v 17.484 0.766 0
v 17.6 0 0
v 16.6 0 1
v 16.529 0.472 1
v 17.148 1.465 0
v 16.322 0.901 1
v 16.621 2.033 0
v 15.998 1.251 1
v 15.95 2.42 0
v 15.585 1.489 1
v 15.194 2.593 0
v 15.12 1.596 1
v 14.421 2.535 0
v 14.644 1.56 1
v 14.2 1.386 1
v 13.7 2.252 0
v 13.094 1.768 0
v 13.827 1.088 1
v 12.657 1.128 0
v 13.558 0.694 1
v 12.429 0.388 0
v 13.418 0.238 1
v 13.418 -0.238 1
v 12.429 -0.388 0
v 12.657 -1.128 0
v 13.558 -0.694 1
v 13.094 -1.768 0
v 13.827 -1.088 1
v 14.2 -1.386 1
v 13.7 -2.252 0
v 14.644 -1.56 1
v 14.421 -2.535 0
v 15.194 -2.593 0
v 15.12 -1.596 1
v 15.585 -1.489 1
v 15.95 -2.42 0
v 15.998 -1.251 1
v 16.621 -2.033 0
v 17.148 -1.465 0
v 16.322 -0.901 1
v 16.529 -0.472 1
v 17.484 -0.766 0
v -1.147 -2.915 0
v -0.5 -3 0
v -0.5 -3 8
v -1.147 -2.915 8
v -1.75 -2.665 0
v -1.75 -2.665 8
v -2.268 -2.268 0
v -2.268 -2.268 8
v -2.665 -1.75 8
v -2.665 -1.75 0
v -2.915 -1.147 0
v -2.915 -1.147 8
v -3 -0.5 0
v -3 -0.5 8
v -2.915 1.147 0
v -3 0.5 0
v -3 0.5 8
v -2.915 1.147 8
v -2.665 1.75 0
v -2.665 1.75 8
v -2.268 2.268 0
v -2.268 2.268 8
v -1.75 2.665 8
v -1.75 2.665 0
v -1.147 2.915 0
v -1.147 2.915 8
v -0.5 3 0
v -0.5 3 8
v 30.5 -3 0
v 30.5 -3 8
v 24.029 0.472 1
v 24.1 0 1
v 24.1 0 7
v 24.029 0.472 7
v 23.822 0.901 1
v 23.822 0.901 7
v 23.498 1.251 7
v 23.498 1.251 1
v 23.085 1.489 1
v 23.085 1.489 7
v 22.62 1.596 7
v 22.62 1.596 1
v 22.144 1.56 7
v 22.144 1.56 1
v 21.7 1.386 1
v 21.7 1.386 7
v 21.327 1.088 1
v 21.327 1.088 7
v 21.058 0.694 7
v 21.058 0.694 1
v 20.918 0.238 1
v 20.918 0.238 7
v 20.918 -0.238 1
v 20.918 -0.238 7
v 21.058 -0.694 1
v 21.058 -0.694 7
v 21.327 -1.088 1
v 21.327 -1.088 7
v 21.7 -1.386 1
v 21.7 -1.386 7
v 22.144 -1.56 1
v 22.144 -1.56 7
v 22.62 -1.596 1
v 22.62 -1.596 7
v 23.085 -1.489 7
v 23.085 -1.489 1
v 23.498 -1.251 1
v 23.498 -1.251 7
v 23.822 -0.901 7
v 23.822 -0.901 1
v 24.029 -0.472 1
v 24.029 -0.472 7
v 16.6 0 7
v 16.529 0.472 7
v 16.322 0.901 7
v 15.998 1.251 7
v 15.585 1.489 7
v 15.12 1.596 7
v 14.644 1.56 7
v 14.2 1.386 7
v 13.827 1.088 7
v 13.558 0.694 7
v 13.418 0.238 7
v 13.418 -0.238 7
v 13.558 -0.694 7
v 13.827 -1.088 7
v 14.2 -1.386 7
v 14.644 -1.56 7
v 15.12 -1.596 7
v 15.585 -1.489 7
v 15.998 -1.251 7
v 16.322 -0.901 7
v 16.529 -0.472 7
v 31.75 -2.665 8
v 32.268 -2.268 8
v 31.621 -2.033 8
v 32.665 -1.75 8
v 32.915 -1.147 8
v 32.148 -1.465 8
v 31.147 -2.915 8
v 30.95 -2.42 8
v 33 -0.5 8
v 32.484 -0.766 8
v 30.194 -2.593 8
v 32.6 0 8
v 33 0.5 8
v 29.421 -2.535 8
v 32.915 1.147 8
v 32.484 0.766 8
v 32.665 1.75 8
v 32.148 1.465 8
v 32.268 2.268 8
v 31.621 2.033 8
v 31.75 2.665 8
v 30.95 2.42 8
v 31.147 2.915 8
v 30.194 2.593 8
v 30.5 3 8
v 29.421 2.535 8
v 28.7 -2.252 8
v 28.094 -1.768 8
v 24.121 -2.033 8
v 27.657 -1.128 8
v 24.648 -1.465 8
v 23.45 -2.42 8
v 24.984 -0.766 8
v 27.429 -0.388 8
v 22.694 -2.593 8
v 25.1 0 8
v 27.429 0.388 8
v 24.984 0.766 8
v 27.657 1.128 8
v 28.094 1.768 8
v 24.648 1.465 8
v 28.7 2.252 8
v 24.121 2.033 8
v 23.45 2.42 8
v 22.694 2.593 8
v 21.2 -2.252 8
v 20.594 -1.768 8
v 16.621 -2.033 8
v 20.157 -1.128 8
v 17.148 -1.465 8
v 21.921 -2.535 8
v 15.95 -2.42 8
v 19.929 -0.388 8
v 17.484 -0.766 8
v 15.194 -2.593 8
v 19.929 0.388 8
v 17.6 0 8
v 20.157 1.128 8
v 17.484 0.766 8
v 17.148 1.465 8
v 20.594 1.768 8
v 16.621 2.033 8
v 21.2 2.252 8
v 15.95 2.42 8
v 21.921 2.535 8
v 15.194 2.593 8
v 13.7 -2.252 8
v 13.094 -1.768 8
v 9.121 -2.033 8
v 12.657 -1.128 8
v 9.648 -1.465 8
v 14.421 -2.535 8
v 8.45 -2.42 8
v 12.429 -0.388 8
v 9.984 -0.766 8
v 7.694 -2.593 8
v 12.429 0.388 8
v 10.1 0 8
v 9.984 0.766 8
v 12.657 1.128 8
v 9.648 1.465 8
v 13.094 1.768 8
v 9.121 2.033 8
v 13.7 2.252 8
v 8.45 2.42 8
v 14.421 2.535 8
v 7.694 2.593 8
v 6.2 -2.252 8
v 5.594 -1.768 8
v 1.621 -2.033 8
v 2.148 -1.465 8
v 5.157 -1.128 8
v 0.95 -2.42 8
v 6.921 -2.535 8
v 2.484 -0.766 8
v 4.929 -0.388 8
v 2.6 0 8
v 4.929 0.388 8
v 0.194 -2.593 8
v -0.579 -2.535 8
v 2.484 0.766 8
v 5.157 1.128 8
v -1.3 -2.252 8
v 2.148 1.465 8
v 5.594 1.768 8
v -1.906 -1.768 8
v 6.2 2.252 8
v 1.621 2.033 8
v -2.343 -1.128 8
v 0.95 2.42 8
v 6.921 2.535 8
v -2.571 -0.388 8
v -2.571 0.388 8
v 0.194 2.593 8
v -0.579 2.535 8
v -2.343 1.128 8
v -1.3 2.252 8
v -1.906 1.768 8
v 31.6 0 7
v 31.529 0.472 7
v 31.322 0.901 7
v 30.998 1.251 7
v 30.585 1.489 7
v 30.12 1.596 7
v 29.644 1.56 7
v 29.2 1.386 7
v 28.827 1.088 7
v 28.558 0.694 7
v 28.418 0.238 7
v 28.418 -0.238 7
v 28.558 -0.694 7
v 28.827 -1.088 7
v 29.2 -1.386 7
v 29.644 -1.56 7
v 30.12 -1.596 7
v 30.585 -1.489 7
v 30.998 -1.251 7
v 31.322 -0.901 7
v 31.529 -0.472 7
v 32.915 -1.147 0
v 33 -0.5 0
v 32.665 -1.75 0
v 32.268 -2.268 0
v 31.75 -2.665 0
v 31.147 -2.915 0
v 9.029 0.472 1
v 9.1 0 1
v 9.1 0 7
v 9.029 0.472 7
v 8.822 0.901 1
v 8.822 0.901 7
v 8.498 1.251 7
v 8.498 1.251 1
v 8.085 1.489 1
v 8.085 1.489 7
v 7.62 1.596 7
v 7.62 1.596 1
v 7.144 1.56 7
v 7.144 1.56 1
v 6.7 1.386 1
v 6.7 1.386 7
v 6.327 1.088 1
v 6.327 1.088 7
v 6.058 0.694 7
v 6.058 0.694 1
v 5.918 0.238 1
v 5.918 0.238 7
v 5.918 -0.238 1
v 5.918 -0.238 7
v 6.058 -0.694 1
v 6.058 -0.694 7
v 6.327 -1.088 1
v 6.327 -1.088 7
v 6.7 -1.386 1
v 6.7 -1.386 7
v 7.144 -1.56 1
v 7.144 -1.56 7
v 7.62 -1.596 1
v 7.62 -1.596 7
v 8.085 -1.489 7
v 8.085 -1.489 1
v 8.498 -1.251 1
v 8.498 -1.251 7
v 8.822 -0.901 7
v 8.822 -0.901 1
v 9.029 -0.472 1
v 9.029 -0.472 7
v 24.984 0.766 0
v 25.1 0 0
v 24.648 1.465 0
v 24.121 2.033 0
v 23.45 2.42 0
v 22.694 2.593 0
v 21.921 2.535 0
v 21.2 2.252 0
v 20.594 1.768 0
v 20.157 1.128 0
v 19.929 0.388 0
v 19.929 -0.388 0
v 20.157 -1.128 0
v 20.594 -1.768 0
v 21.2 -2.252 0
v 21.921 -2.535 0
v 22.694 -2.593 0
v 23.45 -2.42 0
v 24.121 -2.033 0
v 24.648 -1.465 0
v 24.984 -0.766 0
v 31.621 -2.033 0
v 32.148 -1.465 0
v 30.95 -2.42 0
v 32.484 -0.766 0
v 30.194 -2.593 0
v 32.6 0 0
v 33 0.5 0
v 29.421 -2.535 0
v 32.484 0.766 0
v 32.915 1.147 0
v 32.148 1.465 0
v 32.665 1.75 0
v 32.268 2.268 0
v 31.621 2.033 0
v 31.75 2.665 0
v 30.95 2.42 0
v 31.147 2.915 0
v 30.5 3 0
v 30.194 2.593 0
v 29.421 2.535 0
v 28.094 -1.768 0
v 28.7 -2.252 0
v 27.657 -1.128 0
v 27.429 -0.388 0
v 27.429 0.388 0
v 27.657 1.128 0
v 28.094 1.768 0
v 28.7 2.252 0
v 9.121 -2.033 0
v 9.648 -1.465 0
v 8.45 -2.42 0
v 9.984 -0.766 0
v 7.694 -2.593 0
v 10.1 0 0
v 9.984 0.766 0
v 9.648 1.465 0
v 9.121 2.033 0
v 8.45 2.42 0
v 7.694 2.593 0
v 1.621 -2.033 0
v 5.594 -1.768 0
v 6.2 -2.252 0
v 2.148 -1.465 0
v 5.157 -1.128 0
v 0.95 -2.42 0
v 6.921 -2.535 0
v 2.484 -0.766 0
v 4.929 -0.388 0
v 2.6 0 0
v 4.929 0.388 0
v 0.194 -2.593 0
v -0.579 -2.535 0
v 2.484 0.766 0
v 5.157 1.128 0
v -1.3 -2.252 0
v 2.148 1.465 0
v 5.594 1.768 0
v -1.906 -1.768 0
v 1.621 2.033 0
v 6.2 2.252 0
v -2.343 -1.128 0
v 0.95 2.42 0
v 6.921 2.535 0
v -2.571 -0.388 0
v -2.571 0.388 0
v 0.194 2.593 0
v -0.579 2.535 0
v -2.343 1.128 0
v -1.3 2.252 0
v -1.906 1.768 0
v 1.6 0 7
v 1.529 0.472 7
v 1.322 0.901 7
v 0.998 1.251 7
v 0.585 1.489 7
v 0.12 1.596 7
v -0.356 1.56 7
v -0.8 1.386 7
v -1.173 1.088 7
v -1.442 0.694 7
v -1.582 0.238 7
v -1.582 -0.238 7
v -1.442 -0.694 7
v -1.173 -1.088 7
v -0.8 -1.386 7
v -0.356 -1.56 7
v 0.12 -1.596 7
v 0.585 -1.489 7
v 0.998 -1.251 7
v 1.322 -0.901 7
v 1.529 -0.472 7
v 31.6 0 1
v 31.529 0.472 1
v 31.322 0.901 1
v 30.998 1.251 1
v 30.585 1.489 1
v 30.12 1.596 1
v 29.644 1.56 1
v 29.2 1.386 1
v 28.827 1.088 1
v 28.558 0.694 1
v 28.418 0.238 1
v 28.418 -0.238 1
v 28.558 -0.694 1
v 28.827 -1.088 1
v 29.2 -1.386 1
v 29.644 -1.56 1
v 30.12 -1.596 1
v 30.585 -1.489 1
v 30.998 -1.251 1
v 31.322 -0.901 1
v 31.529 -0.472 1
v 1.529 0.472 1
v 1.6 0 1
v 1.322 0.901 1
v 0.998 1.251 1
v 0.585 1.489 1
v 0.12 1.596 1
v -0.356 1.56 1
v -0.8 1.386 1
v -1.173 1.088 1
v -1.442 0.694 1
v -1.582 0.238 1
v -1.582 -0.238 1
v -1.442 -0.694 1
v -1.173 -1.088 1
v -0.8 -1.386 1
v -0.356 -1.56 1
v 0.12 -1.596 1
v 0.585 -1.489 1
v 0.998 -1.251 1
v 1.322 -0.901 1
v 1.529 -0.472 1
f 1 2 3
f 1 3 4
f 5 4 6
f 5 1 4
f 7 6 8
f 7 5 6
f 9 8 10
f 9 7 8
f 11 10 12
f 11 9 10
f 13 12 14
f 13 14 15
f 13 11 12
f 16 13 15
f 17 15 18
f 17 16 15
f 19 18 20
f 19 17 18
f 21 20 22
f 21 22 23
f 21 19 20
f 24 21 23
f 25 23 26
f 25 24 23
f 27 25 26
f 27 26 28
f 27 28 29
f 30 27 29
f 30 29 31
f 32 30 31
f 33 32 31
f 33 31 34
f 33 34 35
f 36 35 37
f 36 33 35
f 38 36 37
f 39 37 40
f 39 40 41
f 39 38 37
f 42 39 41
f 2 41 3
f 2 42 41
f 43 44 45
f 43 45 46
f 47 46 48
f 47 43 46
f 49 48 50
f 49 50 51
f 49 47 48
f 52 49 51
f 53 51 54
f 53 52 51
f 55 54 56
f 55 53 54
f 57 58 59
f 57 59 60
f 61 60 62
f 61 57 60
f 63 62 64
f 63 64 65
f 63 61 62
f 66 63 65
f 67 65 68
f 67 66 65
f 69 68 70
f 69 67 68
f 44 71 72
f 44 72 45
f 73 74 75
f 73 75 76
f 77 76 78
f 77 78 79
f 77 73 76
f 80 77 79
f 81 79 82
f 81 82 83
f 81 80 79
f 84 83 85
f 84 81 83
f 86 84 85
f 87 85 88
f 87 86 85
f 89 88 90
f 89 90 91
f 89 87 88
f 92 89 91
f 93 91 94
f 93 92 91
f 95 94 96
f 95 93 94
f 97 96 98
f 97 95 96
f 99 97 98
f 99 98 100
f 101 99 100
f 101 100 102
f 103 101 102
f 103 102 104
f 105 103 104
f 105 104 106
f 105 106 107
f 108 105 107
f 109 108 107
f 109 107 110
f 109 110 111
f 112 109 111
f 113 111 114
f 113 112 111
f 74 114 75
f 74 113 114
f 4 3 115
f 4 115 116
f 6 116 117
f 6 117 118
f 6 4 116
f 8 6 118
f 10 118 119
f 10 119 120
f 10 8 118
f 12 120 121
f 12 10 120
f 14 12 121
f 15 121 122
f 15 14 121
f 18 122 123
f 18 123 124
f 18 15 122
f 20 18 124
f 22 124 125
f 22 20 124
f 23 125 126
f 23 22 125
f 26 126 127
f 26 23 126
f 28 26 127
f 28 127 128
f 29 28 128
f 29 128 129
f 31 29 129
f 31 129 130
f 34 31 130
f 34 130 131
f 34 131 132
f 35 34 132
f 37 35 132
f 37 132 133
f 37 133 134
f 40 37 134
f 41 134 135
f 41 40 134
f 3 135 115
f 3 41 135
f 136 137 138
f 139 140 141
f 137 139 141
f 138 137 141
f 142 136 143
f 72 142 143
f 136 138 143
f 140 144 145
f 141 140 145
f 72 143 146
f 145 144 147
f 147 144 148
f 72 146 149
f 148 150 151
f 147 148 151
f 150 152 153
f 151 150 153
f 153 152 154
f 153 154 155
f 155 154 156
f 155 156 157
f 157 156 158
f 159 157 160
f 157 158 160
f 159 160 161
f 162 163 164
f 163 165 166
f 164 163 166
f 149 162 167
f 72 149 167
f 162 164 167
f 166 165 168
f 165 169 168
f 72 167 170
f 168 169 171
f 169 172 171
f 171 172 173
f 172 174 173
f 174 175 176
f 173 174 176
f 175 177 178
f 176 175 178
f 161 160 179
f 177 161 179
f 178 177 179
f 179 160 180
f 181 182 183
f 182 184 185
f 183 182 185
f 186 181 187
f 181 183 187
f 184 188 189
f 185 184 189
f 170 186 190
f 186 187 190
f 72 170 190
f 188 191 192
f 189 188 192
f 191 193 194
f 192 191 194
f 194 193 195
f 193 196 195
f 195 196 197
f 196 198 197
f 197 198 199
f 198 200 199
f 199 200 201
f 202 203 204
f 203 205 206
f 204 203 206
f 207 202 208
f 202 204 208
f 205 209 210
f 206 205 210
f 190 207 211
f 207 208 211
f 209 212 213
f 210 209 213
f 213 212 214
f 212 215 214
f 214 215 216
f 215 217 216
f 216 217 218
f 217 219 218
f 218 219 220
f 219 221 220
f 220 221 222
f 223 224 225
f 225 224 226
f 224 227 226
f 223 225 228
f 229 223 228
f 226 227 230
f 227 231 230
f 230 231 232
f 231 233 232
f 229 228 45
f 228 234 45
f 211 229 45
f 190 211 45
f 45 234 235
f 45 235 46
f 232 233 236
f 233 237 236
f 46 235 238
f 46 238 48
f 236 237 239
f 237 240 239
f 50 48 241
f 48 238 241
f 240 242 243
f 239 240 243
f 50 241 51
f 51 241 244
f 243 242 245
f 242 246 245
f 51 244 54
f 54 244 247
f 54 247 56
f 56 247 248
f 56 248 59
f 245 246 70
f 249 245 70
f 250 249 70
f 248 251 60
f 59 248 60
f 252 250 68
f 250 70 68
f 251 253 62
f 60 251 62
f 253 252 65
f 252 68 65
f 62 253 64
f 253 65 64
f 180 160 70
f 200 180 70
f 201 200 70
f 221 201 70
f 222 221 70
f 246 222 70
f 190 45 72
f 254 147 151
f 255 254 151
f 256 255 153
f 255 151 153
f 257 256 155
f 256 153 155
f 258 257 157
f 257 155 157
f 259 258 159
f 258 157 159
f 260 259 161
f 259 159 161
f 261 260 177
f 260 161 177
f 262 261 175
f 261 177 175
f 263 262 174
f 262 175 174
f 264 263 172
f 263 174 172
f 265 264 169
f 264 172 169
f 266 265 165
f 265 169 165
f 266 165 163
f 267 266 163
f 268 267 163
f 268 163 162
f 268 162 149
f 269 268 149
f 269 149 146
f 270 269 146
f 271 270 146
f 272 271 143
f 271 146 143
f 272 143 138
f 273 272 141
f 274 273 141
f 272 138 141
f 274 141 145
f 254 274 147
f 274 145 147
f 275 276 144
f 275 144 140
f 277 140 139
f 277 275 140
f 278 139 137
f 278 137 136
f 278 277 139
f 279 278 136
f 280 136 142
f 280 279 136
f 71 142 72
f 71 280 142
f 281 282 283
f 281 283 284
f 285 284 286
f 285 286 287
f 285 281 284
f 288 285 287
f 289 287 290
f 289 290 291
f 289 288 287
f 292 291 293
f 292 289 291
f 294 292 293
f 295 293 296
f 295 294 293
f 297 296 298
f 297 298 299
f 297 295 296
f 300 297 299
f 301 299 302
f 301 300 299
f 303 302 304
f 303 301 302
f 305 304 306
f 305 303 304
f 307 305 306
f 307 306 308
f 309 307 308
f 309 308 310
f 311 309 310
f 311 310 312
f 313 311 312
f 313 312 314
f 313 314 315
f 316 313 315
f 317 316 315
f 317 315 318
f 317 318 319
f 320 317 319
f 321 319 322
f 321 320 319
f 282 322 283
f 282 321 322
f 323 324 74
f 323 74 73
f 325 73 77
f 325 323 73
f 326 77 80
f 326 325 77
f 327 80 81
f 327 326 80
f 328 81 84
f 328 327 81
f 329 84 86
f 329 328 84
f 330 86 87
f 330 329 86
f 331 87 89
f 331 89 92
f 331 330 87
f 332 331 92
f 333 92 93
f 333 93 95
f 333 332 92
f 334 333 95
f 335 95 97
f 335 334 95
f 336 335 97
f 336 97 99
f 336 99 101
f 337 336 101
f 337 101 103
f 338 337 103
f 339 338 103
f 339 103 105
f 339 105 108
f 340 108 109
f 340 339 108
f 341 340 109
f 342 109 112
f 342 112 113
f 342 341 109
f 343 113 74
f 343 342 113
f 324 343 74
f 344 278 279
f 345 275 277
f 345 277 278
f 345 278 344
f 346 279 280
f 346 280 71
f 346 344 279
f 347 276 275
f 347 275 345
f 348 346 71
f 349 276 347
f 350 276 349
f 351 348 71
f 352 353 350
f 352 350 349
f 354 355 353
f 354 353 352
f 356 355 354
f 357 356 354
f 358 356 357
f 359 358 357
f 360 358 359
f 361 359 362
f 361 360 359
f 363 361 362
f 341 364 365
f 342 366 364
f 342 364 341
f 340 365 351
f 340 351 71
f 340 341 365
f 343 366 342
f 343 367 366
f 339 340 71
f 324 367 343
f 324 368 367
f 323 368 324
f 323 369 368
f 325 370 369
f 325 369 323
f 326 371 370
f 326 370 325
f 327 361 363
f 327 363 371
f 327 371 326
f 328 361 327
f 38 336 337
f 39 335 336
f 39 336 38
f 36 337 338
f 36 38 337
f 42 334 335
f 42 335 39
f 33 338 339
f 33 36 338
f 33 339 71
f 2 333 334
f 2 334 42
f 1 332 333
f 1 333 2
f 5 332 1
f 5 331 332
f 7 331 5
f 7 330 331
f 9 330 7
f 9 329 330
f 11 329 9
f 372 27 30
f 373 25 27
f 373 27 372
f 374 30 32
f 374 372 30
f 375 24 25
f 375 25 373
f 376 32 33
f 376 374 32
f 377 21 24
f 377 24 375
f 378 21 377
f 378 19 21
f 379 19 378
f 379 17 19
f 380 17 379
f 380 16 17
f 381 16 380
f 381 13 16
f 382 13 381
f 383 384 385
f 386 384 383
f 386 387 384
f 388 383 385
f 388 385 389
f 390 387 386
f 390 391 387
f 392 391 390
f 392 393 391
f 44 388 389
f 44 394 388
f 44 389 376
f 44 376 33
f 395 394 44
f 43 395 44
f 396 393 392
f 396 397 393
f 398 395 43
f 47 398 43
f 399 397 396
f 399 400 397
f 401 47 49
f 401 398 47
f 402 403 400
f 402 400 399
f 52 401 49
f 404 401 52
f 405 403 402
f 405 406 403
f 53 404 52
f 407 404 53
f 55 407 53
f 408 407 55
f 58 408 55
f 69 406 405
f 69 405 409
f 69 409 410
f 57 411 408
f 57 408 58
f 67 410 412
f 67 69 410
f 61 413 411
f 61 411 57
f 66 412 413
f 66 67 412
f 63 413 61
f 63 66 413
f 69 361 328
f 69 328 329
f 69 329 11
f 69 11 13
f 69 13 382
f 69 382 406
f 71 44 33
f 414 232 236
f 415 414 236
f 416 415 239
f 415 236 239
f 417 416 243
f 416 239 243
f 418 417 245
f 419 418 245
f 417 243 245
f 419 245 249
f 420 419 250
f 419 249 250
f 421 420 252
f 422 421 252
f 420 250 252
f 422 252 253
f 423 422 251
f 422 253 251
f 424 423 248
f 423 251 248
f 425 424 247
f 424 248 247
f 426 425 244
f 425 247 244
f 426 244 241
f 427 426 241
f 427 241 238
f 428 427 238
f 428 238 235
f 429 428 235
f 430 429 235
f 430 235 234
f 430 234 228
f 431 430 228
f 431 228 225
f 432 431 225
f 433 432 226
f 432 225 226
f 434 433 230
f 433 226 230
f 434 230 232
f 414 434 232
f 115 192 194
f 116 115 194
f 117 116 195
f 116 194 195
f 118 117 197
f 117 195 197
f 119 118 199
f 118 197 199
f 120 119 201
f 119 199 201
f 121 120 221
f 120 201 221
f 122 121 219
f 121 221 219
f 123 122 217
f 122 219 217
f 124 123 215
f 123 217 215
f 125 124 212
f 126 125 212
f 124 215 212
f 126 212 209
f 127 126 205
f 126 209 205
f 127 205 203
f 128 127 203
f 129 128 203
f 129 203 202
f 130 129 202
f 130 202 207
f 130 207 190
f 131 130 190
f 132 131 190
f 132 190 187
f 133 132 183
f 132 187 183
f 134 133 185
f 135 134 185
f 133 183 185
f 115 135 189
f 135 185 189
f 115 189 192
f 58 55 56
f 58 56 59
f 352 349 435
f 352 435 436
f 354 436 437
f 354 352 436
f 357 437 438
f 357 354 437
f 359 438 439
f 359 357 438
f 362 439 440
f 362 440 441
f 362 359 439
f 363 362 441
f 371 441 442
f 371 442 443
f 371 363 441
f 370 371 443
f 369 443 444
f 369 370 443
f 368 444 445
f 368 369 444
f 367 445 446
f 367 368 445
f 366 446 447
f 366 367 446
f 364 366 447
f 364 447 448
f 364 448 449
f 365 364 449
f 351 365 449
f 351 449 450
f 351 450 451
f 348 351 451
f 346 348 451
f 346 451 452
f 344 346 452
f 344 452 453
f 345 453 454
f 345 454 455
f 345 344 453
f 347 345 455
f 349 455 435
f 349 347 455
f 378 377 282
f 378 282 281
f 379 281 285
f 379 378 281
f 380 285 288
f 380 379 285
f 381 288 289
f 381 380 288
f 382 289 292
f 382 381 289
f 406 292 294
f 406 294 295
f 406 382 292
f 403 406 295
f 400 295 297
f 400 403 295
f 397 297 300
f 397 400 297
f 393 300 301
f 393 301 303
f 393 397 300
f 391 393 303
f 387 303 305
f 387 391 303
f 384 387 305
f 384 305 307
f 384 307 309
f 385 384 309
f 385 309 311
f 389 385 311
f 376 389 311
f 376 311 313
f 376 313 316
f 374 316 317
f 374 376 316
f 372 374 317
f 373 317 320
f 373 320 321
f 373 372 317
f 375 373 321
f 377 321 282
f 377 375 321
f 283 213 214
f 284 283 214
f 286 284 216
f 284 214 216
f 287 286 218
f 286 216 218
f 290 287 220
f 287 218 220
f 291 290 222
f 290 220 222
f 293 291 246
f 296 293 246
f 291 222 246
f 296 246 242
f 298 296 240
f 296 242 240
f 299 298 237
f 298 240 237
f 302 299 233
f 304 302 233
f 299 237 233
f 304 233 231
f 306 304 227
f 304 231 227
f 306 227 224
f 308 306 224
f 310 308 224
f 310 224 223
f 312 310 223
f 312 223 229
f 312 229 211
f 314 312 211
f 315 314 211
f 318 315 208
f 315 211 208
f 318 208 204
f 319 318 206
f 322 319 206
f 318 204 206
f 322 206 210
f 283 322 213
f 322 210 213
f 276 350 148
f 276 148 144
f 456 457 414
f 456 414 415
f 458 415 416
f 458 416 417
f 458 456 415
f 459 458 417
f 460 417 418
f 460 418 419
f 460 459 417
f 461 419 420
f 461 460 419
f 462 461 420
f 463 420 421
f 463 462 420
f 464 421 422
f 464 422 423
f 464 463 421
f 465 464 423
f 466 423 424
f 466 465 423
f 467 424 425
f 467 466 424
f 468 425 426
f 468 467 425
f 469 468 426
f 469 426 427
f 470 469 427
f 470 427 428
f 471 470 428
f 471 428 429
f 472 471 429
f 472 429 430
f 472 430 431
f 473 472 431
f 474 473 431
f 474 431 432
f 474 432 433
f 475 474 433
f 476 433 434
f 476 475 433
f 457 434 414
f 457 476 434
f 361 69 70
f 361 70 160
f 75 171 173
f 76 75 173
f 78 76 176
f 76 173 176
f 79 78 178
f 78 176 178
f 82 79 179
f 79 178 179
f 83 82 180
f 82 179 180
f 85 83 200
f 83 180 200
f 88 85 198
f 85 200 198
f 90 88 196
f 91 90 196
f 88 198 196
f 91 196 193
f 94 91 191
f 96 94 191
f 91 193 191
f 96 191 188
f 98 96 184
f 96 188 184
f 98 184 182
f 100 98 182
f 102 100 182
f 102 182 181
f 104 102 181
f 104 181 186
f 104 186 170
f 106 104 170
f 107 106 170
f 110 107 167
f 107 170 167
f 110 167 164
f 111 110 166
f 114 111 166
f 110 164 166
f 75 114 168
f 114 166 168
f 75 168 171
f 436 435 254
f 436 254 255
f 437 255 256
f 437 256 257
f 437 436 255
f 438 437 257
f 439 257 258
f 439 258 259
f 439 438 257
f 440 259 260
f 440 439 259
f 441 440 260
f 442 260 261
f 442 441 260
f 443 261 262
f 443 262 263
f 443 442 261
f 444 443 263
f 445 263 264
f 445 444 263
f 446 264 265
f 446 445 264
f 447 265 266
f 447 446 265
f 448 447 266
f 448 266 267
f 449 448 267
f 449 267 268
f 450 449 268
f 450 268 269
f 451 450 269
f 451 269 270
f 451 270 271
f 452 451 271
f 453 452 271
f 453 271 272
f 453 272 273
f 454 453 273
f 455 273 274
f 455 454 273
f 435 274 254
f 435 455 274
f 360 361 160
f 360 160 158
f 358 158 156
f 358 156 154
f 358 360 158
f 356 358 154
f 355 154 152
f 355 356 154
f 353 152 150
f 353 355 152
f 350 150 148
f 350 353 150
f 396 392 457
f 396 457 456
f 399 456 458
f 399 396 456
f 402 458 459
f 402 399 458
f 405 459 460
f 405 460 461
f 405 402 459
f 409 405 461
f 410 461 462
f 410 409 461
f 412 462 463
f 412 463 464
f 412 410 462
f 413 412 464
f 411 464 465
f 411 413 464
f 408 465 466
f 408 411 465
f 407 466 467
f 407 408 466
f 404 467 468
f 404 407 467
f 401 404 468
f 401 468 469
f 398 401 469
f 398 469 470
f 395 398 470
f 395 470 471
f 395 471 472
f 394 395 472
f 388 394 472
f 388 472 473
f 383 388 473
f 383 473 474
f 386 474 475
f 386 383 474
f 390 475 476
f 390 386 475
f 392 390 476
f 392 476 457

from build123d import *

# Parameters (mm, degrees)
SKETCH1_R           = 1.6
BOSS_EXTRUDE1_DEPTH = 8
CHAMFER1_SIZE       = 1


with BuildPart() as part:
    # Sketch1 → Boss-Extrude1 (new body)
    with BuildSketch(Plane.XY):
        with BuildLine():
            Line((-0.5, 3), (30.5, 3))
            ThreePointArc((30.5, 3), (32.267766953, 2.267766953), (33, 0.5))
            Line((33, 0.5), (33, -0.5))
            ThreePointArc((33, -0.5), (32.267766953, -2.267766953), (30.5, -3))
            Line((30.5, -3), (-0.5, -3))
            ThreePointArc((-0.5, -3), (-2.267766953, -2.267766953), (-3, -0.5))
            Line((-3, -0.5), (-3, 0.5))
            ThreePointArc((-3, 0.5), (-2.267766953, 2.267766953), (-0.5, 3))
        make_face()
        Circle(SKETCH1_R, mode=Mode.SUBTRACT)
        with Locations((7.5, 0)):
            Circle(SKETCH1_R, mode=Mode.SUBTRACT)
        with Locations((15, 0)):
            Circle(SKETCH1_R, mode=Mode.SUBTRACT)
        with Locations((22.5, 0)):
            Circle(SKETCH1_R, mode=Mode.SUBTRACT)
        with Locations((30, 0)):
            Circle(SKETCH1_R, mode=Mode.SUBTRACT)
    extrude(amount=BOSS_EXTRUDE1_DEPTH)

    # Chamfer1
    chamfer1_edges = [part.edges().sort_by_distance(p)[0] for p in [
        (-1.6, 0, 0),
        (-1.6, 0, 8),
        (5.9, 0, 0),
        (5.9, 0, 8),
        (13.4, 0, 0),
        (13.4, 0, 8),
        (20.9, 0, 0),
        (20.9, 0, 8),
        (28.4, 0, 0),
        (28.4, 0, 8),
    ]]
    chamfer(chamfer1_edges, length=CHAMFER1_SIZE)


solid = part.part
